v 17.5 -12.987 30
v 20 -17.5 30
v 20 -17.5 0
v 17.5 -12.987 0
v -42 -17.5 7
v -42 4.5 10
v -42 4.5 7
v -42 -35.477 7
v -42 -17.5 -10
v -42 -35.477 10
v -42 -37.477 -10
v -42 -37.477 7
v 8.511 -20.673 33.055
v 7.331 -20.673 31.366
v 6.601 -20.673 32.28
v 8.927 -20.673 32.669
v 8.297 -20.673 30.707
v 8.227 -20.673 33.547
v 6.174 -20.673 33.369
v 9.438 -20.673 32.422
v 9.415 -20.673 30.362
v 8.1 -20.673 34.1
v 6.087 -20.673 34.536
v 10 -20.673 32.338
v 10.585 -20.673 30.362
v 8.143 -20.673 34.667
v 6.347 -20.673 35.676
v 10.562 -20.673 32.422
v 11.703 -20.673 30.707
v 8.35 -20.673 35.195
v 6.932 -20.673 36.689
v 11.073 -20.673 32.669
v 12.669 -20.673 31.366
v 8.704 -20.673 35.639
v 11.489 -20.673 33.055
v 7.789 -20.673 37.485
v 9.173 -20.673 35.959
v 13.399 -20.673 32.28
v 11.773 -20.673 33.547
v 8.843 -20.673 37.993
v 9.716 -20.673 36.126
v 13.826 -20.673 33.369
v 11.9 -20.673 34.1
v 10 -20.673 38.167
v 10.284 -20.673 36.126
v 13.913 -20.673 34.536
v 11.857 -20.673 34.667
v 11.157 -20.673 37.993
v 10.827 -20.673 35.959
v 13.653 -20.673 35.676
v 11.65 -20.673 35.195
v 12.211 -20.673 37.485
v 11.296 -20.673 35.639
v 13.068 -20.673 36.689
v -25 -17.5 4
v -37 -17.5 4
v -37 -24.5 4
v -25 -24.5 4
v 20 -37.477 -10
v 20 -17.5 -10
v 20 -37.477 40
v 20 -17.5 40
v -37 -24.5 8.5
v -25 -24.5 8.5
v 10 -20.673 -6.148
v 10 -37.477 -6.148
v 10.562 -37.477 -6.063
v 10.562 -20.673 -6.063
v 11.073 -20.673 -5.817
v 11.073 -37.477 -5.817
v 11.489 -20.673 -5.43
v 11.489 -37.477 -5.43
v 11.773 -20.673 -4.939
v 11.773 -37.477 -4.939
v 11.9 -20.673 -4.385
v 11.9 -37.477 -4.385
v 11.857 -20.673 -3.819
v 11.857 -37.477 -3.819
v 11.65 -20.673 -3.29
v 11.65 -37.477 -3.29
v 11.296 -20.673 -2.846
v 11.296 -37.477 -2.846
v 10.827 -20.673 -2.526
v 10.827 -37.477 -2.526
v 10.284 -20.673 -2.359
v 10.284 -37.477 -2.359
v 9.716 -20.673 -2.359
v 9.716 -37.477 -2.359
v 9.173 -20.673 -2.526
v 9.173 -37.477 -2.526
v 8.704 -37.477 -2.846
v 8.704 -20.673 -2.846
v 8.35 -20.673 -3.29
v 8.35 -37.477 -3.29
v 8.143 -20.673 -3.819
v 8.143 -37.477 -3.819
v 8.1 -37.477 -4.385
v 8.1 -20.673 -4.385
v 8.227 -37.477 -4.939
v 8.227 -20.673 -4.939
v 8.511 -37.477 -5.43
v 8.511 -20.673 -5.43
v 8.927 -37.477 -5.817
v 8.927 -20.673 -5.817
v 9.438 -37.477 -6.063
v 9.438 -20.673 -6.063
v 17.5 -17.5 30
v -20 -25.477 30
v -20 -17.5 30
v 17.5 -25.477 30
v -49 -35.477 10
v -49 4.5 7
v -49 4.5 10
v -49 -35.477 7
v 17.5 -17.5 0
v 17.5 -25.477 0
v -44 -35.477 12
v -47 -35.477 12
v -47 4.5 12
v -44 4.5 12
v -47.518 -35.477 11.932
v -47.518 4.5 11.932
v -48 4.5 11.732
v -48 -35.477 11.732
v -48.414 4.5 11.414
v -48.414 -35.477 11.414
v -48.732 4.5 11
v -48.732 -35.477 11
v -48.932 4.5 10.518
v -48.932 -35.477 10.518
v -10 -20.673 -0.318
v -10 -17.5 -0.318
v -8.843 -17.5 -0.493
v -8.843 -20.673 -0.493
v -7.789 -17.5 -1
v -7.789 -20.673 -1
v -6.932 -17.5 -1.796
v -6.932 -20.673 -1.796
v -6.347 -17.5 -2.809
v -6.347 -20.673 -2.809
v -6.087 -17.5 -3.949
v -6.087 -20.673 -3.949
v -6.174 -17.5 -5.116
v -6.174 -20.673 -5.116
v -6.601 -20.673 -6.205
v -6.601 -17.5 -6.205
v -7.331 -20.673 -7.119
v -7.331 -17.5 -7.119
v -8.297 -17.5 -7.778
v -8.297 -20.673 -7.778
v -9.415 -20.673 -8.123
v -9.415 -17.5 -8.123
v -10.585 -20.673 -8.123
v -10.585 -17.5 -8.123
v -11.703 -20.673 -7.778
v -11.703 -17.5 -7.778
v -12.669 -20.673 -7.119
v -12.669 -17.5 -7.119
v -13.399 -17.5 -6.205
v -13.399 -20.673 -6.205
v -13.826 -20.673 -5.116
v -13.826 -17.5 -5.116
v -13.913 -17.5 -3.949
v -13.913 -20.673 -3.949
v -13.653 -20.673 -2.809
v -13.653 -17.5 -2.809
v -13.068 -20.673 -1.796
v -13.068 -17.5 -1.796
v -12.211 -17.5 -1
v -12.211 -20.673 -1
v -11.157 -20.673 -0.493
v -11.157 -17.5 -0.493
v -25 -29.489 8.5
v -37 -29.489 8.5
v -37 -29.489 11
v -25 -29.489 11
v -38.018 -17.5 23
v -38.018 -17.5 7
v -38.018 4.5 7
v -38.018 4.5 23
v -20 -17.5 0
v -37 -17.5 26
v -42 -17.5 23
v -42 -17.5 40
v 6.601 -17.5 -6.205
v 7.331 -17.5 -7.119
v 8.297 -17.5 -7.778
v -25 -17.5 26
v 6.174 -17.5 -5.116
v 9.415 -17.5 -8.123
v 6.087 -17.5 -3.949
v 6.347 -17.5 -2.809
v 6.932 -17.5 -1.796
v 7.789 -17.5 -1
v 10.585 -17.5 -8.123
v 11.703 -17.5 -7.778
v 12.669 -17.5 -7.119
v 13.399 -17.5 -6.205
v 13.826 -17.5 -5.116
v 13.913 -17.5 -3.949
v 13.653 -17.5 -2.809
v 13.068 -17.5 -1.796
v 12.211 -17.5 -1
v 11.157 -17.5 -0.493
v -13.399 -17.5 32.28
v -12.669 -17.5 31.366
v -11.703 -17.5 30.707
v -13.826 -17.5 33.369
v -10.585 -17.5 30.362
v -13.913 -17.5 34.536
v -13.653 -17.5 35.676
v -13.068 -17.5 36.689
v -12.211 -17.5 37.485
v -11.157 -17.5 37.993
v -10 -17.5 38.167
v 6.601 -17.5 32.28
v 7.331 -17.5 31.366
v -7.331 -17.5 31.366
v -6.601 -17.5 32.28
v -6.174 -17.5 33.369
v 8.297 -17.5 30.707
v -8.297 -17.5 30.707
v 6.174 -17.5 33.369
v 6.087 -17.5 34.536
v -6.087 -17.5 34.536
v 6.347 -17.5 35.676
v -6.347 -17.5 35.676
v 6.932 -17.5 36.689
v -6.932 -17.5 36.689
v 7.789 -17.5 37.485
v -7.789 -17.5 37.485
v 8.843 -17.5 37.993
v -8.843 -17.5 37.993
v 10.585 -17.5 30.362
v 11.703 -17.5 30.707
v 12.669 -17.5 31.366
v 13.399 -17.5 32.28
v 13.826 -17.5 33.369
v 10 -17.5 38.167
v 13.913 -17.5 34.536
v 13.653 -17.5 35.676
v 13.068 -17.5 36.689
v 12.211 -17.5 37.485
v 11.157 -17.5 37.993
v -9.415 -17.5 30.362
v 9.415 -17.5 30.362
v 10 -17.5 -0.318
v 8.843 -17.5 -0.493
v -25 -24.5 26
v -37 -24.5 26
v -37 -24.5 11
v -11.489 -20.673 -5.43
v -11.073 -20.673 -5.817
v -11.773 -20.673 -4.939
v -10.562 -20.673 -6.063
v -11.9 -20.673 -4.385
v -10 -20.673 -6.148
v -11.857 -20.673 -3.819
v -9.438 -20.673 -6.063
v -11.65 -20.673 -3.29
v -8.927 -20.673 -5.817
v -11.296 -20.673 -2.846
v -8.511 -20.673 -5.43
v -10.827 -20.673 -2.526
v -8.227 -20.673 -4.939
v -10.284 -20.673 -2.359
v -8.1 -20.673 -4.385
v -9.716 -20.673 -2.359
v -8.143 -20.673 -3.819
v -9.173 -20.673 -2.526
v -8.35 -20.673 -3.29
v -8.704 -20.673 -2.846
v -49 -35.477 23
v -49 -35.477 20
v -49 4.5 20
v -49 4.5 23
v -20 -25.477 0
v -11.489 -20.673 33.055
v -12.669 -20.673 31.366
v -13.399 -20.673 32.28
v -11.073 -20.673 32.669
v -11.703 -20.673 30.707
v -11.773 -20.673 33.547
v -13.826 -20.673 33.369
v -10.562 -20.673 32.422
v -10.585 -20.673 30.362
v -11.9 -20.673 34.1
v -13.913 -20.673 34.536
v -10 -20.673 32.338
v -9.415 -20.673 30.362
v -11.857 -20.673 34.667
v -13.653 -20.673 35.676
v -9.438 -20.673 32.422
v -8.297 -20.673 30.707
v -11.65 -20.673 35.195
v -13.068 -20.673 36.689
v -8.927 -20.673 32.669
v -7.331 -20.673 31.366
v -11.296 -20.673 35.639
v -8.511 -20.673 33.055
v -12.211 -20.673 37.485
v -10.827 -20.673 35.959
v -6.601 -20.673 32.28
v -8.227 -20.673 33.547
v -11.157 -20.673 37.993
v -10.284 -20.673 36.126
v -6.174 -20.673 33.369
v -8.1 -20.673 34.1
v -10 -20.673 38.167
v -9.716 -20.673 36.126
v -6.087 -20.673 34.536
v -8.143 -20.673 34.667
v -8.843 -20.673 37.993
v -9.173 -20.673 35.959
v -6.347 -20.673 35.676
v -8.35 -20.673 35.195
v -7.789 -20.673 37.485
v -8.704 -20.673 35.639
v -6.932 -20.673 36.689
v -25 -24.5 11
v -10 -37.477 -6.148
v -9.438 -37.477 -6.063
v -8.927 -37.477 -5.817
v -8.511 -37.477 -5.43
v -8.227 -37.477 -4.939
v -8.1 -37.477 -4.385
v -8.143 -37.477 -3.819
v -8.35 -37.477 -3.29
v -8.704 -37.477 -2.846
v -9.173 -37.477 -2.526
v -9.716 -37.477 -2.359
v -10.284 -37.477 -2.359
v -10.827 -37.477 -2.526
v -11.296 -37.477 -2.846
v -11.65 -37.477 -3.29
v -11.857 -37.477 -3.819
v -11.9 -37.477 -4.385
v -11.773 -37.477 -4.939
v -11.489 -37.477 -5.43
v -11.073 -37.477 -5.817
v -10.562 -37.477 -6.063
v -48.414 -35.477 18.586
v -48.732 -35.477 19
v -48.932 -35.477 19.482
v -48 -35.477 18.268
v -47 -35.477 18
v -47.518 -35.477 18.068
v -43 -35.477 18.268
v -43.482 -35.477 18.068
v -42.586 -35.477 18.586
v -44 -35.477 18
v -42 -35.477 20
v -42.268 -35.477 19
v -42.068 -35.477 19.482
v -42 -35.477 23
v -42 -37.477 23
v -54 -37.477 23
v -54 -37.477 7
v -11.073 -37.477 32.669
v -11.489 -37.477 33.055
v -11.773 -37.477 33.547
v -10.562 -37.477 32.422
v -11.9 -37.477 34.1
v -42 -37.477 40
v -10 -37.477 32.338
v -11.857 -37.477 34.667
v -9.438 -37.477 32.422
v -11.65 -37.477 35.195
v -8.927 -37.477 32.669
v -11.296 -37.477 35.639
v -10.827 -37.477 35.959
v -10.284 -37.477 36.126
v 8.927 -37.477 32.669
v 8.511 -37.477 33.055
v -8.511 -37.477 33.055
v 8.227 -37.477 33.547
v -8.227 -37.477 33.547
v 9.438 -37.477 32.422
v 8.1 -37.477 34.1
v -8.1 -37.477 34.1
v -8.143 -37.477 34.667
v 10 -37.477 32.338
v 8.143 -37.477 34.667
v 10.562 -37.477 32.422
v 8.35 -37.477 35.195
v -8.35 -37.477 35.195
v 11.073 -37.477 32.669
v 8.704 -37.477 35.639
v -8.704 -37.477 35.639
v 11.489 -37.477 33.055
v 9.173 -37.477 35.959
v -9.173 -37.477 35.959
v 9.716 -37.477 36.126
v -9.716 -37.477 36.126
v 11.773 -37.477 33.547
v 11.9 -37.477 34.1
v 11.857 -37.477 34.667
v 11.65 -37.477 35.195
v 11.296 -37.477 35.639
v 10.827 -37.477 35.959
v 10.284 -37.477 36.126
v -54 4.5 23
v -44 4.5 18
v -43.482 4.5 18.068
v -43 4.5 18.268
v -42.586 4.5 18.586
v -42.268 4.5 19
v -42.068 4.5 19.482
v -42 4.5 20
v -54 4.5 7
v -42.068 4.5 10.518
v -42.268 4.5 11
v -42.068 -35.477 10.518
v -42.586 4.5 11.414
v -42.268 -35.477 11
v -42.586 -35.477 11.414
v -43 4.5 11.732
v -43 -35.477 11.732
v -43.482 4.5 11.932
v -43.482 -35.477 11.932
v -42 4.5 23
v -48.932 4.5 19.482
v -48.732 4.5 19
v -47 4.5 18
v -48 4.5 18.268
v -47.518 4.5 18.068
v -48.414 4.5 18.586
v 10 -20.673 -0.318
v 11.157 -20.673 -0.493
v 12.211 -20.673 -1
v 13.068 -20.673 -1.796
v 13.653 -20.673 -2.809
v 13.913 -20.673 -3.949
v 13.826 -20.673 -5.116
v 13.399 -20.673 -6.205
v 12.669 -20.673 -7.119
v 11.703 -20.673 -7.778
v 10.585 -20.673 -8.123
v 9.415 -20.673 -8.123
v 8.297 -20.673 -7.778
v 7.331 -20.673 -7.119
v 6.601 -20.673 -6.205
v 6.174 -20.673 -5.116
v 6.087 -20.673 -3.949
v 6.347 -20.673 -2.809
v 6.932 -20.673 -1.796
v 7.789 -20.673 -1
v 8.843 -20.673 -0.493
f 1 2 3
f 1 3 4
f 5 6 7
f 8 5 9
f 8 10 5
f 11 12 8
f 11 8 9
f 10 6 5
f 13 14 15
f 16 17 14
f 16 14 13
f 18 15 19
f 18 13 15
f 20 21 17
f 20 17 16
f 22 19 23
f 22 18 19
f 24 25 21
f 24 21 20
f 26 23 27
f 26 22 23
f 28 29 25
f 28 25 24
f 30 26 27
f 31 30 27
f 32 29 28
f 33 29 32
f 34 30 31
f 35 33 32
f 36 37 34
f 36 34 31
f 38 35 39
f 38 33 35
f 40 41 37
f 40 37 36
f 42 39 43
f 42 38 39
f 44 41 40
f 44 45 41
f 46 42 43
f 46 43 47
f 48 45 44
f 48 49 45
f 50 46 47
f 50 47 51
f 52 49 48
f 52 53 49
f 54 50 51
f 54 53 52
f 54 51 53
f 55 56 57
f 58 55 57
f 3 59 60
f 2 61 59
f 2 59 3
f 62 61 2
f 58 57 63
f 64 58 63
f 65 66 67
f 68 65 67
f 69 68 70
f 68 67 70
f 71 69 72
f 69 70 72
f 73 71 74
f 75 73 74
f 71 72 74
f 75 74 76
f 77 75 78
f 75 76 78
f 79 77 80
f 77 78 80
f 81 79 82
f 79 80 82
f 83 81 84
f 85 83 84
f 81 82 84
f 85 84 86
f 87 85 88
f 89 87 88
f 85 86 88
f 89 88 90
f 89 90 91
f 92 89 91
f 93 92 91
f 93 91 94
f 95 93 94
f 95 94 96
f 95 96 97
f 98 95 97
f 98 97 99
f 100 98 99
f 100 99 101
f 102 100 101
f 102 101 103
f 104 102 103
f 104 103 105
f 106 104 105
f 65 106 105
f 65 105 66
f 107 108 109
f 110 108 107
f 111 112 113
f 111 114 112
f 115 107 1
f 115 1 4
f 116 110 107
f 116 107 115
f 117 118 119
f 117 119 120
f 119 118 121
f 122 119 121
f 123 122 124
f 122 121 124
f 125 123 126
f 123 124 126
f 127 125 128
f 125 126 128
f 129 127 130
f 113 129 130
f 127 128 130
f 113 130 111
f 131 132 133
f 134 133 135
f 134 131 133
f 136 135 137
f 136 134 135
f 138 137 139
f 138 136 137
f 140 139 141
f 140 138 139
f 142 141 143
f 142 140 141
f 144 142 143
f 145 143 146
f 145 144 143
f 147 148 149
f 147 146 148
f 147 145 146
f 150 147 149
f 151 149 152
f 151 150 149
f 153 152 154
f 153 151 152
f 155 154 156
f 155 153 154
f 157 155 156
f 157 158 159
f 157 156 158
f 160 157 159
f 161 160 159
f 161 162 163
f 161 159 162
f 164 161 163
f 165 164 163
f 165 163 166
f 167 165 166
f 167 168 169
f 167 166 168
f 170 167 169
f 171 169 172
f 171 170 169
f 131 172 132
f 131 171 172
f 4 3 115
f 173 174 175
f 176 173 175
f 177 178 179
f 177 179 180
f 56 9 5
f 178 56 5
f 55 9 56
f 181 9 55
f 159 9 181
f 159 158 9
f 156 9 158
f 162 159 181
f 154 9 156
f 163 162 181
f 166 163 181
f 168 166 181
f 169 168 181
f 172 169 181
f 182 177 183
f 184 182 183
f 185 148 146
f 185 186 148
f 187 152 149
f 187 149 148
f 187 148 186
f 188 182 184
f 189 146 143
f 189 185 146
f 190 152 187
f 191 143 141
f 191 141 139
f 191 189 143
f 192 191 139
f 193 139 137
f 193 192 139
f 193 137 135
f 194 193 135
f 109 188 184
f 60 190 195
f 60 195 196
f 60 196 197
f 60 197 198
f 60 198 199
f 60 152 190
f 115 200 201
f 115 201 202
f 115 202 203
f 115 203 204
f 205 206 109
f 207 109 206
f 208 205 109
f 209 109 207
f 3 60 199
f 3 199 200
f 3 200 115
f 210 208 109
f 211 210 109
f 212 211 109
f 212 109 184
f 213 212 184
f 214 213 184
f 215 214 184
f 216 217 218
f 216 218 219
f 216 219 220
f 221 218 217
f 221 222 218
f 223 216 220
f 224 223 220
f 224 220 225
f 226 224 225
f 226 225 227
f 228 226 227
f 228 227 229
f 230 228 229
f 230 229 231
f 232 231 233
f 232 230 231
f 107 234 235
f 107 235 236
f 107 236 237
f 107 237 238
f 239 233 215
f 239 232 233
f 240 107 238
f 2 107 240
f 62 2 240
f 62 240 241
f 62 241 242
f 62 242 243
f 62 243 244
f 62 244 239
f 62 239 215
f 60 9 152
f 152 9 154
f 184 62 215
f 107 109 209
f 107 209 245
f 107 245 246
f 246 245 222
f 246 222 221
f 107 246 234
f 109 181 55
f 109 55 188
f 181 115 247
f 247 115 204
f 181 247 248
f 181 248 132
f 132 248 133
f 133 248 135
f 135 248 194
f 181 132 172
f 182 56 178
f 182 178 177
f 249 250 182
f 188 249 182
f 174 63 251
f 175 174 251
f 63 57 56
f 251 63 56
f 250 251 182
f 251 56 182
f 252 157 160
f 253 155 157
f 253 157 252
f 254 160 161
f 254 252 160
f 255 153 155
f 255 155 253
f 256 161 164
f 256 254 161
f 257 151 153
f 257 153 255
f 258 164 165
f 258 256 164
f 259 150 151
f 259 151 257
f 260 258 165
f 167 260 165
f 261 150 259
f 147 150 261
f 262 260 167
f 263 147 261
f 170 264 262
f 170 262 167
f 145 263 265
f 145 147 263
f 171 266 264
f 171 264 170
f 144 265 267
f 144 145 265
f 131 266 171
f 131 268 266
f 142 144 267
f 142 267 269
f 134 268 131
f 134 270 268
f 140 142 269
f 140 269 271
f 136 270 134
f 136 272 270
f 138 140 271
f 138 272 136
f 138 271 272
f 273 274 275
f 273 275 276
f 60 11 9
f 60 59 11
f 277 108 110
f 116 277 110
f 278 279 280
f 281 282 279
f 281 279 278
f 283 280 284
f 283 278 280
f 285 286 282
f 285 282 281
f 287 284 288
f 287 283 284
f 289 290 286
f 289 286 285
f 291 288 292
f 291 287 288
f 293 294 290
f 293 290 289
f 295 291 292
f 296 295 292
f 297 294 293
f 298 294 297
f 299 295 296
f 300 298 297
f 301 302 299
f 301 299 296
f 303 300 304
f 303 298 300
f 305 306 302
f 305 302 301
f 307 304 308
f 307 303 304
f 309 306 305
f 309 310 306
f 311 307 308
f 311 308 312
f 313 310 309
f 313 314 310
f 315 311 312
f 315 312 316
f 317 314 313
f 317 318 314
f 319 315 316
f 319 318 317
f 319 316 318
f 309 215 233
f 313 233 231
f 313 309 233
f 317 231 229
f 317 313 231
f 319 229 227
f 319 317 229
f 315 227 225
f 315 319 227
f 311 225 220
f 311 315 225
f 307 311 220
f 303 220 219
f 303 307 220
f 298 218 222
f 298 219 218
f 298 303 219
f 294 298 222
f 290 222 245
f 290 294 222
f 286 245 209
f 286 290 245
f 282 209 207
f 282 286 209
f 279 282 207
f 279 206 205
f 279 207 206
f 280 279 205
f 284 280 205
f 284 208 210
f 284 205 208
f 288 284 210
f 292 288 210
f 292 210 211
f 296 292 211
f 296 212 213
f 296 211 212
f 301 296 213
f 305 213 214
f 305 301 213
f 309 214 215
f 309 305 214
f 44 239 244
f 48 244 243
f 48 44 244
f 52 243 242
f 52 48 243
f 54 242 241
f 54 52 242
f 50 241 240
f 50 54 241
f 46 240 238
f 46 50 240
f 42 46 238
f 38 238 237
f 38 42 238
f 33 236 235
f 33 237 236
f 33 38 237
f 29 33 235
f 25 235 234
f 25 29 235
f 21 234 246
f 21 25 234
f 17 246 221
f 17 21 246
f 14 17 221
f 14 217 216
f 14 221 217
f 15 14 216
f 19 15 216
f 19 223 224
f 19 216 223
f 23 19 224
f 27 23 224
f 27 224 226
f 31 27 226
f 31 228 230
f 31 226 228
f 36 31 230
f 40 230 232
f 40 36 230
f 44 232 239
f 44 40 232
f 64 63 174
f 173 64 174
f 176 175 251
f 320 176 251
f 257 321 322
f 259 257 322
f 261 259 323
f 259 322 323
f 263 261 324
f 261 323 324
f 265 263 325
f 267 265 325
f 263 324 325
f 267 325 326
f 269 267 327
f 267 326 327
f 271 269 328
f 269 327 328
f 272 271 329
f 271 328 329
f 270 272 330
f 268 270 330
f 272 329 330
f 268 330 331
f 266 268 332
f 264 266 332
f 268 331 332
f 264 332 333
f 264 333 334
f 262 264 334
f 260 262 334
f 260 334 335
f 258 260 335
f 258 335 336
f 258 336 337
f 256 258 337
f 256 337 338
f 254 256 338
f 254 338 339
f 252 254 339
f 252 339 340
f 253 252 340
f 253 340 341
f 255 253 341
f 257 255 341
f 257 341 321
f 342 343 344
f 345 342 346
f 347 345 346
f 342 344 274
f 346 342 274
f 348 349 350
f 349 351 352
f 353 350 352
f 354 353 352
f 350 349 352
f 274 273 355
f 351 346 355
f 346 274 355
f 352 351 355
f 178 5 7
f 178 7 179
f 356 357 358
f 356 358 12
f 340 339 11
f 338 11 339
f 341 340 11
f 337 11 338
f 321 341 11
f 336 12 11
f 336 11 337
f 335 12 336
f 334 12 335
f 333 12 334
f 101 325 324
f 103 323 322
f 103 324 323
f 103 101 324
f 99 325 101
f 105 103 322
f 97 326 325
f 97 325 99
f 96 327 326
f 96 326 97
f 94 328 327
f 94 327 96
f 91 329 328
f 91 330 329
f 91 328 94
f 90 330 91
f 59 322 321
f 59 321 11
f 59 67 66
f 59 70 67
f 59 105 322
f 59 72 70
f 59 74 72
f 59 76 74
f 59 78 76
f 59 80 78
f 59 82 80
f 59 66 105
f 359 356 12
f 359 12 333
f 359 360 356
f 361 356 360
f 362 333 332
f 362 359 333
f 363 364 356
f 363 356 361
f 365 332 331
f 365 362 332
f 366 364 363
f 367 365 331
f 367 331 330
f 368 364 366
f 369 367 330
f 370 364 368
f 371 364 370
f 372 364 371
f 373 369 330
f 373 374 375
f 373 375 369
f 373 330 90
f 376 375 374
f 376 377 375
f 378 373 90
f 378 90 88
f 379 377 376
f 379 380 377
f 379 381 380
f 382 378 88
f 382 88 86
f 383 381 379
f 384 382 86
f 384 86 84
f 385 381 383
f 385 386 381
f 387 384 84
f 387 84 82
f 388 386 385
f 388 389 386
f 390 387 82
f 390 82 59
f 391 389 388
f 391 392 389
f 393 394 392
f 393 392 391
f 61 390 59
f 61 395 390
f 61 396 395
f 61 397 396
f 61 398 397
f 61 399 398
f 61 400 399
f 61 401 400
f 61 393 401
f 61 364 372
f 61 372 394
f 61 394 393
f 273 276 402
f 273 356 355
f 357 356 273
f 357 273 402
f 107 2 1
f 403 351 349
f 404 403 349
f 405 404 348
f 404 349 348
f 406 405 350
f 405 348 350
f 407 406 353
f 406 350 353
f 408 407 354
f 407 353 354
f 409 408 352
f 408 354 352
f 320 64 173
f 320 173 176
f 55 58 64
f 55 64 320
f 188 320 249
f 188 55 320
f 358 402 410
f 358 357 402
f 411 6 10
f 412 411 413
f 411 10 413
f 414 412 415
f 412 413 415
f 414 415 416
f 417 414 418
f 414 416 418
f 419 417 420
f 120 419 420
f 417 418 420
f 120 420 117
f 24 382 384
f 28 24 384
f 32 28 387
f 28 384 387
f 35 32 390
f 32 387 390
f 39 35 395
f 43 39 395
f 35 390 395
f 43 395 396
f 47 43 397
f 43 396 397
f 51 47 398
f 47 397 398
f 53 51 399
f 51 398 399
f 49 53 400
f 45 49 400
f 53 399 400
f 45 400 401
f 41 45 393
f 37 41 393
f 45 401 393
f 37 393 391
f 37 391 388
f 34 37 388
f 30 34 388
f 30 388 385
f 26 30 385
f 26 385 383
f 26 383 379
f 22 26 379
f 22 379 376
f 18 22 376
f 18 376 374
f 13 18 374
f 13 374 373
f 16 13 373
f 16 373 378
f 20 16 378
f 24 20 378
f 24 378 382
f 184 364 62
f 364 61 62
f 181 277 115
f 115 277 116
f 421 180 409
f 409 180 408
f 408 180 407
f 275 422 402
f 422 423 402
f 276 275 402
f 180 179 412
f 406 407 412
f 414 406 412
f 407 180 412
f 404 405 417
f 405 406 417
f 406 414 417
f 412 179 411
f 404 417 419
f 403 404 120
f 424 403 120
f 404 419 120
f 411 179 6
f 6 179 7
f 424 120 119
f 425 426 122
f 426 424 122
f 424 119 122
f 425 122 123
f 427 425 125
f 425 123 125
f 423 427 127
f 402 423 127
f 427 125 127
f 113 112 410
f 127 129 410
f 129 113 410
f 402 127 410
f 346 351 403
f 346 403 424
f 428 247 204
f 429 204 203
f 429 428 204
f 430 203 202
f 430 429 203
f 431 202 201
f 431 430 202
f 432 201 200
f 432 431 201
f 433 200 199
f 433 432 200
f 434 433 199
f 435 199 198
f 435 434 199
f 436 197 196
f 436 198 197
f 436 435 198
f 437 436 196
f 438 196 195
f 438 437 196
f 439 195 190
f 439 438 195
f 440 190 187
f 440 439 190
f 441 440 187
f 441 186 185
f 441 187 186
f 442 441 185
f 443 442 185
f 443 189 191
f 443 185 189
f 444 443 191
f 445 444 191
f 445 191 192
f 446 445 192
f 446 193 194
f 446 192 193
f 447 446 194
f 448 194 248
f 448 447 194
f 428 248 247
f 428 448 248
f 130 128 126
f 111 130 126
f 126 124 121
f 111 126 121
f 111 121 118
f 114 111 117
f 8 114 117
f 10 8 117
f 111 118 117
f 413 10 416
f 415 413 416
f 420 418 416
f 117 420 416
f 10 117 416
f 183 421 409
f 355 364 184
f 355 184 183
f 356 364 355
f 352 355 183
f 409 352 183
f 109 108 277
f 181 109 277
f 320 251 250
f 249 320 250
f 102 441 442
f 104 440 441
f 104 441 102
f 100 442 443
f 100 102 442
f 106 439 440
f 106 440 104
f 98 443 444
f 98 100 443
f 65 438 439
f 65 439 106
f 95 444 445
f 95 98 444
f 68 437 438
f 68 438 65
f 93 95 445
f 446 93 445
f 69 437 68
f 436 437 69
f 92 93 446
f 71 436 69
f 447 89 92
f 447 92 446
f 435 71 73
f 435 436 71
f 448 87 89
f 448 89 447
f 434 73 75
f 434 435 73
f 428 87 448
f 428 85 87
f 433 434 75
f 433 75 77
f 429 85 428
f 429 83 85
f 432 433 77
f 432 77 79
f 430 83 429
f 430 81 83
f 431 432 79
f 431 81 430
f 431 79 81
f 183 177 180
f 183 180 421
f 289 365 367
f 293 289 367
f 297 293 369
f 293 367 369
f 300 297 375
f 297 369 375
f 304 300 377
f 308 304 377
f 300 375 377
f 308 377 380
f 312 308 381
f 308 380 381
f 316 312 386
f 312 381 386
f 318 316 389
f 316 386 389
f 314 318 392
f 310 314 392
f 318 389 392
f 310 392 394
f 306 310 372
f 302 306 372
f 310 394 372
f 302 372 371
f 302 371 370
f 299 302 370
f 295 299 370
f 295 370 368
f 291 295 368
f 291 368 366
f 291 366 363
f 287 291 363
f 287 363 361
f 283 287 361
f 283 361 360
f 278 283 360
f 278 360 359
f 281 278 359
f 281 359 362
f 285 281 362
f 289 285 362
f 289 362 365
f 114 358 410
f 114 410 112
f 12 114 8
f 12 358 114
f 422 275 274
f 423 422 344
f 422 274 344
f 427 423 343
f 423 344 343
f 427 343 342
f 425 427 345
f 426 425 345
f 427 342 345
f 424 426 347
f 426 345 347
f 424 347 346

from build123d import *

# Parameters (mm, degrees)
SKETCH1_R               = 17.5
BOSS_EXTRUDE1_DEPTH     = 30
SKETCH5_R               = 10.95
CUT_EXTRUDE2_DEPTH      = 39.890873
SWEEP2_PITCH            = 10
SKETCH8_R               = 17.5
CUT_EXTRUDE3_DEPTH      = 41.699
SKETCH9_R               = 17.5
CUT_EXTRUDE4_DEPTH      = 39.890874
SKETCH10_W              = 40
SKETCH10_H              = 19.977262
BOSS_EXTRUDE2_DEPTH     = 40
SKETCH11_W              = 40
SKETCH11_H              = 19.977262
BOSS_EXTRUDE3_DEPTH     = 10
BOSS_EXTRUDE4_DEPTH     = 30
SKETCH14_R              = 1.905
CUT_EXTRUDE5_DEPTH      = 71.869594
SKETCH15_R              = 3.9243
CUT_EXTRUDE7_DEPTH      = 59.798031
SKETCH16_W              = 50
SKETCH16_H              = 19.977262
BOSS_EXTRUDE5_DEPTH     = 22
CUT_EXTRUDE8_DEPTH      = 12
BOSS_EXTRUDE6_DEPTH     = 19.977262
BOSS_EXTRUDE7_DEPTH     = 22
FILLET1_R               = 2
SKETCH21_W              = 7
SKETCH21_H              = 16
BOSS_EXTRUDE8_DEPTH     = 2
CUT_EXTRUDE9_DEPTH      = 76.769387
CUT_EXTRUDE9_DEPTH_BACK = 76.769387
SKETCH22_W              = 37.5
SKETCH22_H              = 30
SKETCH24_W              = 37.5
SKETCH24_H              = 30
BOSS_EXTRUDE9_DEPTH     = 12


with BuildPart() as part:
    # Sketch1 → Boss-Extrude1 (new body)
    with BuildSketch(Plane.XY):
        Circle(SKETCH1_R)
    extrude(amount=BOSS_EXTRUDE1_DEPTH)

    # Sketch5 → Cut-Extrude2 (cut, through all)
    with BuildSketch(Plane(origin=(0, 0, 0), x_dir=(-1, 0, 0), z_dir=(0, 0, -1))):
        Circle(SKETCH5_R)
    extrude(amount=-CUT_EXTRUDE2_DEPTH, mode=Mode.SUBTRACT)

    # Sweep2: arcs per turn and ends read off the stored shape
    # Sweep2: the profile of Sketch7 profile screwed along a right-hand helix through 3.75 turns, 16 arcs to a turn; built about Z, then put on its axis
    sweep2_z = Axis((0, 0, 0), (0, 0, 1))
    sweep2_corners = [(0, 7.7, 2.933013), (0, 10.9503, 4.809574), (0, 10.9503, 0.190426), (0, 7.7, 2.066987), (0, 7.45, 2.5)]
    with BuildLine(mode=Mode.PRIVATE) as sweep2_profile:
        Line(sweep2_corners[0], sweep2_corners[1])
        Line(sweep2_corners[1], sweep2_corners[2])
        Line(sweep2_corners[2], sweep2_corners[3])
        ThreePointArc((0, 7.7, 2.066987), (0, 7.516988, 2.25), (0, 7.45, 2.5))
        ThreePointArc((0, 7.45, 2.5), (0, 7.516988, 2.75), (0, 7.7, 2.933013))
    sweep2_cap = Face(sweep2_profile.wire())
    sweep2_arcs = [((0, 7.7, 2.066987), (0, 7.45, 2.211325), (0, 7.45, 2.5), (1, 0.8660254037844395, 1)), ((0, 7.45, 2.5), (0, 7.45, 2.788675), (0, 7.7, 2.933013), (1, 0.8660254037844395, 1))]  # start, shoulder, end, weights
    sweep2_turn_angles = [0, 11.25, 22.5, 33.75, 45, 56.25, 67.5, 78.75, 90, 101.25, 112.5, 123.75, 135, 146.25, 157.5, 168.75, 180, 191.25, 202.5, 213.75, 225, 236.25, 247.5, 258.75, 270, 281.25, 292.5, 303.75, 315, 326.25, 337.5, 348.75, 360]
    sweep2_turn_weights = [1, 0.9807852804032304, 1, 0.9807852804032304, 1, 0.9807852804032304, 1, 0.9807852804032304, 1, 0.9807852804032304, 1, 0.9807852804032304, 1, 0.9807852804032304, 1, 0.9807852804032304, 1, 0.9807852804032304, 1, 0.9807852804032304, 1, 0.9807852804032304, 1, 0.9807852804032304, 1, 0.9807852804032304, 1, 0.9807852804032304, 1, 0.9807852804032304, 1, 0.9807852804032304, 1]
    sweep2_turn_rails = [Edge.make_bspline([Vector(p[0], p[1], 0).rotate(sweep2_z, sweep2_turn_angles[k]) / sweep2_turn_weights[k] + Vector(0, 0, p[2] + SWEEP2_PITCH * sweep2_turn_angles[k] / 360) for k in range(33)], [0, 0, 0, 1, 1, 2, 2, 3, 3, 4, 4, 5, 5, 6, 6, 7, 7, 8, 8, 9, 9, 10, 10, 11, 11, 12, 12, 13, 13, 14, 14, 15, 15, 16, 16, 16], 2, sweep2_turn_weights) for p in sweep2_corners]
    sweep2_turn_sides = [*[Face.make_surface_from_curves(sweep2_turn_rails[p[0]], sweep2_turn_rails[p[1]]) for p in [(0, 1), (1, 2), (2, 3)]], *[Face.make_bezier_surface([[Vector(p[j][0], p[j][1], 0).rotate(sweep2_z, sweep2_turn_angles[2 * i + k]) / sweep2_turn_weights[2 * i + k] + Vector(0, 0, p[j][2] + SWEEP2_PITCH * sweep2_turn_angles[2 * i + k] / 360) for k in range(3)] for j in range(3)], [[p[3][j] * sweep2_turn_weights[2 * i + k] for k in range(3)] for j in range(3)]) for p in sweep2_arcs for i in range(16)]]
    sweep2_last_angles = [1080, 1091.25, 1102.5, 1113.75, 1125, 1136.25, 1147.5, 1158.75, 1170, 1181.25, 1192.5, 1203.75, 1215, 1226.25, 1237.5, 1248.75, 1260, 1271.25, 1282.5, 1293.75, 1305, 1316.25, 1327.5, 1338.75, 1350]
    sweep2_last_weights = [1, 0.9807852804032304, 1, 0.9807852804032304, 1, 0.9807852804032304, 1, 0.9807852804032304, 1, 0.9807852804032304, 1, 0.9807852804032304, 1, 0.9807852804032304, 1, 0.9807852804032304, 1, 0.9807852804032304, 1, 0.9807852804032304, 1, 0.9807852804032304, 1, 0.9807852804032304, 1]
    sweep2_last_rails = [Edge.make_bspline([Vector(p[0], p[1], 0).rotate(sweep2_z, sweep2_last_angles[k]) / sweep2_last_weights[k] + Vector(0, 0, p[2] + SWEEP2_PITCH * sweep2_last_angles[k] / 360) for k in range(25)], [0, 0, 0, 1, 1, 2, 2, 3, 3, 4, 4, 5, 5, 6, 6, 7, 7, 8, 8, 9, 9, 10, 10, 11, 11, 12, 12, 12], 2, sweep2_last_weights) for p in sweep2_corners]
    sweep2_last_sides = [*[Face.make_surface_from_curves(sweep2_last_rails[p[0]], sweep2_last_rails[p[1]]) for p in [(0, 1), (1, 2), (2, 3)]], *[Face.make_bezier_surface([[Vector(p[j][0], p[j][1], 0).rotate(sweep2_z, sweep2_last_angles[2 * i + k]) / sweep2_last_weights[2 * i + k] + Vector(0, 0, p[j][2] + SWEEP2_PITCH * sweep2_last_angles[2 * i + k] / 360) for k in range(3)] for j in range(3)], [[p[3][j] * sweep2_last_weights[2 * i + k] for k in range(3)] for j in range(3)]) for p in sweep2_arcs for i in range(12)]]
    sweep2 = Plane(origin=(0, 0, -10), x_dir=(-1, 0, 0), z_dir=(0, 0, 1)) * Solid(Shell([*[p.moved(Location((0, 0, SWEEP2_PITCH * i))) for i in range(3) for p in sweep2_turn_sides], *sweep2_last_sides, sweep2_cap, sweep2_cap.rotate(sweep2_z, 1350).moved(Location((0, 0, SWEEP2_PITCH * 1350 / 360)))]))
    add(sweep2)

    # Sketch8 → Cut-Extrude3 (cut, through all)
    with BuildSketch(Plane(origin=(0, 0, 0), x_dir=(-1, 0, 0), z_dir=(0, 0, -1))):
        with Locations(Location((0, 0, 0), (0, 0, 180))):
            Circle(SKETCH8_R)
    extrude(amount=CUT_EXTRUDE3_DEPTH, mode=Mode.SUBTRACT)

    # Sketch9 → Cut-Extrude4 (cut, through all)
    with BuildSketch(Plane.XY.offset(30)):
        Circle(SKETCH9_R)
    extrude(amount=CUT_EXTRUDE4_DEPTH, mode=Mode.SUBTRACT)



with BuildPart() as body_2:
    # Sketch10 → Boss-Extrude2 (new body)
    with BuildSketch(Plane(origin=(0, 0, 0), x_dir=(-1, 0, 0), z_dir=(0, 0, -1))):
        with Locations((0, -27.488631)):
            Rectangle(SKETCH10_W, SKETCH10_H)
    extrude(amount=-BOSS_EXTRUDE2_DEPTH)

    # Sketch11 → Boss-Extrude3 (add)
    with BuildSketch(Plane(origin=(0, 0, 0), x_dir=(-1, 0, 0), z_dir=(0, 0, -1))):
        with Locations((0, -27.488631)):
            Rectangle(SKETCH11_W, SKETCH11_H)
    extrude(amount=BOSS_EXTRUDE3_DEPTH)


with BuildPart() as part_1:
    add(part.part)

    add(body_2.part)  # Boss-Extrude4 merges body 2
    # Sketch13 → Boss-Extrude4 (add)
    with BuildSketch(Plane(origin=(0, 0, 0), x_dir=(-1, 0, 0), z_dir=(0, 0, -1))):
        with BuildLine():
            Line((0, -17.5), (-20, -17.5))
            Line((-20, -17.5), (-15.153881, -8.752707))
            ThreePointArc((-15.153881, -8.752707), (-8.748646, -15.156226), (0, -17.5))
        make_face()
    boss_extrude4 = extrude(amount=-BOSS_EXTRUDE4_DEPTH)

    # Mirror1: Boss-Extrude4 across plane
    add(boss_extrude4.mirror(Plane(origin=(0, 0, 0), x_dir=(0, 0, 1), z_dir=(1, 0, 0))))

    # Sketch14 → Cut-Extrude5 (cut, through all)
    with BuildSketch(Plane.XZ.offset(37.477262)):
        with Locations(Location((-10, 34.242642, 0), (0, 0, 270))):
            Circle(SKETCH14_R)
        with Locations(Location((10, 34.242642, 0), (0, 0, 270))):
            Circle(SKETCH14_R)
        with Locations(Location((-10, -4.242642, 0), (0, 0, 270))):
            Circle(SKETCH14_R)
        with Locations(Location((10, -4.242642, 0), (0, 0, 270))):
            Circle(SKETCH14_R)
    extrude(amount=-CUT_EXTRUDE5_DEPTH, mode=Mode.SUBTRACT)

    # Sketch15 → Cut-Extrude7 (cut, through all)
    with BuildSketch(Plane(origin=(0, -20.6734, 0), x_dir=(1, 0, 0), z_dir=(0, 1, 0))):
        with Locations(Location((-10, 4.242642, 0), (0, 0, 270))):
            Circle(SKETCH15_R)
        with Locations(Location((10, 4.242642, 0), (0, 0, 270))):
            Circle(SKETCH15_R)
        with Locations(Location((10, -34.242642, 0), (0, 0, 270))):
            Circle(SKETCH15_R)
        with Locations(Location((-10, -34.242642, 0), (0, 0, 270))):
            Circle(SKETCH15_R)
    extrude(amount=CUT_EXTRUDE7_DEPTH, mode=Mode.SUBTRACT)

    # Sketch16 → Boss-Extrude5 (add)
    with BuildSketch(Plane.ZY.offset(20)):
        with Locations((15, -27.488631)):
            Rectangle(SKETCH16_W, SKETCH16_H)
    extrude(amount=BOSS_EXTRUDE5_DEPTH)

    # Sketch17 → Cut-Extrude8 (cut)
    with BuildSketch(Plane.ZY.offset(37)):
        Polygon((4, -24.5), (8.5, -24.5), (8.5, -29.488888), (11, -29.488888), (11, -24.5), (26, -24.5), (26, -17.5), (4, -17.5), align=None)
    extrude(amount=-CUT_EXTRUDE8_DEPTH, mode=Mode.SUBTRACT)

    # Sketch19 → Boss-Extrude6 (add, through all)
    with BuildSketch(Plane(origin=(0, -17.5, 0), x_dir=(1, 0, 0), z_dir=(0, 1, 0))):
        Polygon((-42, -12), (-49, -12), (-49, -7), (-54, -7), (-54, -23), (-49, -23), (-49, -18), (-42, -18), align=None)
    extrude(amount=-BOSS_EXTRUDE6_DEPTH)

    # Sketch20 → Boss-Extrude7 (add)
    with BuildSketch(Plane(origin=(0, -17.5, 0), x_dir=(1, 0, 0), z_dir=(0, 1, 0))):
        Polygon((-54, -7), (-49, -7), (-49, -12), (-42, -12), (-42, -7), (-38.018198, -7), (-38.018198, -23), (-42, -23), (-42, -18), (-49, -18), (-49, -23), (-54, -23), align=None)
    extrude(amount=BOSS_EXTRUDE7_DEPTH)

    # Fillet1
    fillet1_edges = [part_1.edges().sort_by_distance(p)[0] for p in [
        (-42, -16.488631, 12),
        (-42, -16.488631, 18),
        (-49, -16.488631, 18),
        (-49, -16.488631, 12),
    ]]
    fillet(fillet1_edges, radius=FILLET1_R)

    # Sketch21 → Boss-Extrude8 (add)
    with BuildSketch(Plane.XZ.offset(37.477262)):
        with Locations((-45.5, 15)):
            Rectangle(SKETCH21_W, SKETCH21_H)
    extrude(amount=-BOSS_EXTRUDE8_DEPTH)

    # Sketch22 → Cut-Extrude9 (cut, two sides: drawn at the far end of the back side and taken through both)
    with BuildSketch(Plane(origin=(0, -17.5, 0), x_dir=(1, 0, 0), z_dir=(0, 1, 0)).offset(-CUT_EXTRUDE9_DEPTH_BACK)):
        with Locations((-1.25, -15)):
            Rectangle(SKETCH22_W, SKETCH22_H)
    extrude(amount=CUT_EXTRUDE9_DEPTH + CUT_EXTRUDE9_DEPTH_BACK, mode=Mode.SUBTRACT)

    # Sketch24 → Boss-Extrude9 (add)
    with BuildSketch(Plane.XZ.offset(37.477262)):
        with Locations((-1.25, 15)):
            Rectangle(SKETCH24_W, SKETCH24_H)
    extrude(amount=-BOSS_EXTRUDE9_DEPTH)


solid = part_1.part
